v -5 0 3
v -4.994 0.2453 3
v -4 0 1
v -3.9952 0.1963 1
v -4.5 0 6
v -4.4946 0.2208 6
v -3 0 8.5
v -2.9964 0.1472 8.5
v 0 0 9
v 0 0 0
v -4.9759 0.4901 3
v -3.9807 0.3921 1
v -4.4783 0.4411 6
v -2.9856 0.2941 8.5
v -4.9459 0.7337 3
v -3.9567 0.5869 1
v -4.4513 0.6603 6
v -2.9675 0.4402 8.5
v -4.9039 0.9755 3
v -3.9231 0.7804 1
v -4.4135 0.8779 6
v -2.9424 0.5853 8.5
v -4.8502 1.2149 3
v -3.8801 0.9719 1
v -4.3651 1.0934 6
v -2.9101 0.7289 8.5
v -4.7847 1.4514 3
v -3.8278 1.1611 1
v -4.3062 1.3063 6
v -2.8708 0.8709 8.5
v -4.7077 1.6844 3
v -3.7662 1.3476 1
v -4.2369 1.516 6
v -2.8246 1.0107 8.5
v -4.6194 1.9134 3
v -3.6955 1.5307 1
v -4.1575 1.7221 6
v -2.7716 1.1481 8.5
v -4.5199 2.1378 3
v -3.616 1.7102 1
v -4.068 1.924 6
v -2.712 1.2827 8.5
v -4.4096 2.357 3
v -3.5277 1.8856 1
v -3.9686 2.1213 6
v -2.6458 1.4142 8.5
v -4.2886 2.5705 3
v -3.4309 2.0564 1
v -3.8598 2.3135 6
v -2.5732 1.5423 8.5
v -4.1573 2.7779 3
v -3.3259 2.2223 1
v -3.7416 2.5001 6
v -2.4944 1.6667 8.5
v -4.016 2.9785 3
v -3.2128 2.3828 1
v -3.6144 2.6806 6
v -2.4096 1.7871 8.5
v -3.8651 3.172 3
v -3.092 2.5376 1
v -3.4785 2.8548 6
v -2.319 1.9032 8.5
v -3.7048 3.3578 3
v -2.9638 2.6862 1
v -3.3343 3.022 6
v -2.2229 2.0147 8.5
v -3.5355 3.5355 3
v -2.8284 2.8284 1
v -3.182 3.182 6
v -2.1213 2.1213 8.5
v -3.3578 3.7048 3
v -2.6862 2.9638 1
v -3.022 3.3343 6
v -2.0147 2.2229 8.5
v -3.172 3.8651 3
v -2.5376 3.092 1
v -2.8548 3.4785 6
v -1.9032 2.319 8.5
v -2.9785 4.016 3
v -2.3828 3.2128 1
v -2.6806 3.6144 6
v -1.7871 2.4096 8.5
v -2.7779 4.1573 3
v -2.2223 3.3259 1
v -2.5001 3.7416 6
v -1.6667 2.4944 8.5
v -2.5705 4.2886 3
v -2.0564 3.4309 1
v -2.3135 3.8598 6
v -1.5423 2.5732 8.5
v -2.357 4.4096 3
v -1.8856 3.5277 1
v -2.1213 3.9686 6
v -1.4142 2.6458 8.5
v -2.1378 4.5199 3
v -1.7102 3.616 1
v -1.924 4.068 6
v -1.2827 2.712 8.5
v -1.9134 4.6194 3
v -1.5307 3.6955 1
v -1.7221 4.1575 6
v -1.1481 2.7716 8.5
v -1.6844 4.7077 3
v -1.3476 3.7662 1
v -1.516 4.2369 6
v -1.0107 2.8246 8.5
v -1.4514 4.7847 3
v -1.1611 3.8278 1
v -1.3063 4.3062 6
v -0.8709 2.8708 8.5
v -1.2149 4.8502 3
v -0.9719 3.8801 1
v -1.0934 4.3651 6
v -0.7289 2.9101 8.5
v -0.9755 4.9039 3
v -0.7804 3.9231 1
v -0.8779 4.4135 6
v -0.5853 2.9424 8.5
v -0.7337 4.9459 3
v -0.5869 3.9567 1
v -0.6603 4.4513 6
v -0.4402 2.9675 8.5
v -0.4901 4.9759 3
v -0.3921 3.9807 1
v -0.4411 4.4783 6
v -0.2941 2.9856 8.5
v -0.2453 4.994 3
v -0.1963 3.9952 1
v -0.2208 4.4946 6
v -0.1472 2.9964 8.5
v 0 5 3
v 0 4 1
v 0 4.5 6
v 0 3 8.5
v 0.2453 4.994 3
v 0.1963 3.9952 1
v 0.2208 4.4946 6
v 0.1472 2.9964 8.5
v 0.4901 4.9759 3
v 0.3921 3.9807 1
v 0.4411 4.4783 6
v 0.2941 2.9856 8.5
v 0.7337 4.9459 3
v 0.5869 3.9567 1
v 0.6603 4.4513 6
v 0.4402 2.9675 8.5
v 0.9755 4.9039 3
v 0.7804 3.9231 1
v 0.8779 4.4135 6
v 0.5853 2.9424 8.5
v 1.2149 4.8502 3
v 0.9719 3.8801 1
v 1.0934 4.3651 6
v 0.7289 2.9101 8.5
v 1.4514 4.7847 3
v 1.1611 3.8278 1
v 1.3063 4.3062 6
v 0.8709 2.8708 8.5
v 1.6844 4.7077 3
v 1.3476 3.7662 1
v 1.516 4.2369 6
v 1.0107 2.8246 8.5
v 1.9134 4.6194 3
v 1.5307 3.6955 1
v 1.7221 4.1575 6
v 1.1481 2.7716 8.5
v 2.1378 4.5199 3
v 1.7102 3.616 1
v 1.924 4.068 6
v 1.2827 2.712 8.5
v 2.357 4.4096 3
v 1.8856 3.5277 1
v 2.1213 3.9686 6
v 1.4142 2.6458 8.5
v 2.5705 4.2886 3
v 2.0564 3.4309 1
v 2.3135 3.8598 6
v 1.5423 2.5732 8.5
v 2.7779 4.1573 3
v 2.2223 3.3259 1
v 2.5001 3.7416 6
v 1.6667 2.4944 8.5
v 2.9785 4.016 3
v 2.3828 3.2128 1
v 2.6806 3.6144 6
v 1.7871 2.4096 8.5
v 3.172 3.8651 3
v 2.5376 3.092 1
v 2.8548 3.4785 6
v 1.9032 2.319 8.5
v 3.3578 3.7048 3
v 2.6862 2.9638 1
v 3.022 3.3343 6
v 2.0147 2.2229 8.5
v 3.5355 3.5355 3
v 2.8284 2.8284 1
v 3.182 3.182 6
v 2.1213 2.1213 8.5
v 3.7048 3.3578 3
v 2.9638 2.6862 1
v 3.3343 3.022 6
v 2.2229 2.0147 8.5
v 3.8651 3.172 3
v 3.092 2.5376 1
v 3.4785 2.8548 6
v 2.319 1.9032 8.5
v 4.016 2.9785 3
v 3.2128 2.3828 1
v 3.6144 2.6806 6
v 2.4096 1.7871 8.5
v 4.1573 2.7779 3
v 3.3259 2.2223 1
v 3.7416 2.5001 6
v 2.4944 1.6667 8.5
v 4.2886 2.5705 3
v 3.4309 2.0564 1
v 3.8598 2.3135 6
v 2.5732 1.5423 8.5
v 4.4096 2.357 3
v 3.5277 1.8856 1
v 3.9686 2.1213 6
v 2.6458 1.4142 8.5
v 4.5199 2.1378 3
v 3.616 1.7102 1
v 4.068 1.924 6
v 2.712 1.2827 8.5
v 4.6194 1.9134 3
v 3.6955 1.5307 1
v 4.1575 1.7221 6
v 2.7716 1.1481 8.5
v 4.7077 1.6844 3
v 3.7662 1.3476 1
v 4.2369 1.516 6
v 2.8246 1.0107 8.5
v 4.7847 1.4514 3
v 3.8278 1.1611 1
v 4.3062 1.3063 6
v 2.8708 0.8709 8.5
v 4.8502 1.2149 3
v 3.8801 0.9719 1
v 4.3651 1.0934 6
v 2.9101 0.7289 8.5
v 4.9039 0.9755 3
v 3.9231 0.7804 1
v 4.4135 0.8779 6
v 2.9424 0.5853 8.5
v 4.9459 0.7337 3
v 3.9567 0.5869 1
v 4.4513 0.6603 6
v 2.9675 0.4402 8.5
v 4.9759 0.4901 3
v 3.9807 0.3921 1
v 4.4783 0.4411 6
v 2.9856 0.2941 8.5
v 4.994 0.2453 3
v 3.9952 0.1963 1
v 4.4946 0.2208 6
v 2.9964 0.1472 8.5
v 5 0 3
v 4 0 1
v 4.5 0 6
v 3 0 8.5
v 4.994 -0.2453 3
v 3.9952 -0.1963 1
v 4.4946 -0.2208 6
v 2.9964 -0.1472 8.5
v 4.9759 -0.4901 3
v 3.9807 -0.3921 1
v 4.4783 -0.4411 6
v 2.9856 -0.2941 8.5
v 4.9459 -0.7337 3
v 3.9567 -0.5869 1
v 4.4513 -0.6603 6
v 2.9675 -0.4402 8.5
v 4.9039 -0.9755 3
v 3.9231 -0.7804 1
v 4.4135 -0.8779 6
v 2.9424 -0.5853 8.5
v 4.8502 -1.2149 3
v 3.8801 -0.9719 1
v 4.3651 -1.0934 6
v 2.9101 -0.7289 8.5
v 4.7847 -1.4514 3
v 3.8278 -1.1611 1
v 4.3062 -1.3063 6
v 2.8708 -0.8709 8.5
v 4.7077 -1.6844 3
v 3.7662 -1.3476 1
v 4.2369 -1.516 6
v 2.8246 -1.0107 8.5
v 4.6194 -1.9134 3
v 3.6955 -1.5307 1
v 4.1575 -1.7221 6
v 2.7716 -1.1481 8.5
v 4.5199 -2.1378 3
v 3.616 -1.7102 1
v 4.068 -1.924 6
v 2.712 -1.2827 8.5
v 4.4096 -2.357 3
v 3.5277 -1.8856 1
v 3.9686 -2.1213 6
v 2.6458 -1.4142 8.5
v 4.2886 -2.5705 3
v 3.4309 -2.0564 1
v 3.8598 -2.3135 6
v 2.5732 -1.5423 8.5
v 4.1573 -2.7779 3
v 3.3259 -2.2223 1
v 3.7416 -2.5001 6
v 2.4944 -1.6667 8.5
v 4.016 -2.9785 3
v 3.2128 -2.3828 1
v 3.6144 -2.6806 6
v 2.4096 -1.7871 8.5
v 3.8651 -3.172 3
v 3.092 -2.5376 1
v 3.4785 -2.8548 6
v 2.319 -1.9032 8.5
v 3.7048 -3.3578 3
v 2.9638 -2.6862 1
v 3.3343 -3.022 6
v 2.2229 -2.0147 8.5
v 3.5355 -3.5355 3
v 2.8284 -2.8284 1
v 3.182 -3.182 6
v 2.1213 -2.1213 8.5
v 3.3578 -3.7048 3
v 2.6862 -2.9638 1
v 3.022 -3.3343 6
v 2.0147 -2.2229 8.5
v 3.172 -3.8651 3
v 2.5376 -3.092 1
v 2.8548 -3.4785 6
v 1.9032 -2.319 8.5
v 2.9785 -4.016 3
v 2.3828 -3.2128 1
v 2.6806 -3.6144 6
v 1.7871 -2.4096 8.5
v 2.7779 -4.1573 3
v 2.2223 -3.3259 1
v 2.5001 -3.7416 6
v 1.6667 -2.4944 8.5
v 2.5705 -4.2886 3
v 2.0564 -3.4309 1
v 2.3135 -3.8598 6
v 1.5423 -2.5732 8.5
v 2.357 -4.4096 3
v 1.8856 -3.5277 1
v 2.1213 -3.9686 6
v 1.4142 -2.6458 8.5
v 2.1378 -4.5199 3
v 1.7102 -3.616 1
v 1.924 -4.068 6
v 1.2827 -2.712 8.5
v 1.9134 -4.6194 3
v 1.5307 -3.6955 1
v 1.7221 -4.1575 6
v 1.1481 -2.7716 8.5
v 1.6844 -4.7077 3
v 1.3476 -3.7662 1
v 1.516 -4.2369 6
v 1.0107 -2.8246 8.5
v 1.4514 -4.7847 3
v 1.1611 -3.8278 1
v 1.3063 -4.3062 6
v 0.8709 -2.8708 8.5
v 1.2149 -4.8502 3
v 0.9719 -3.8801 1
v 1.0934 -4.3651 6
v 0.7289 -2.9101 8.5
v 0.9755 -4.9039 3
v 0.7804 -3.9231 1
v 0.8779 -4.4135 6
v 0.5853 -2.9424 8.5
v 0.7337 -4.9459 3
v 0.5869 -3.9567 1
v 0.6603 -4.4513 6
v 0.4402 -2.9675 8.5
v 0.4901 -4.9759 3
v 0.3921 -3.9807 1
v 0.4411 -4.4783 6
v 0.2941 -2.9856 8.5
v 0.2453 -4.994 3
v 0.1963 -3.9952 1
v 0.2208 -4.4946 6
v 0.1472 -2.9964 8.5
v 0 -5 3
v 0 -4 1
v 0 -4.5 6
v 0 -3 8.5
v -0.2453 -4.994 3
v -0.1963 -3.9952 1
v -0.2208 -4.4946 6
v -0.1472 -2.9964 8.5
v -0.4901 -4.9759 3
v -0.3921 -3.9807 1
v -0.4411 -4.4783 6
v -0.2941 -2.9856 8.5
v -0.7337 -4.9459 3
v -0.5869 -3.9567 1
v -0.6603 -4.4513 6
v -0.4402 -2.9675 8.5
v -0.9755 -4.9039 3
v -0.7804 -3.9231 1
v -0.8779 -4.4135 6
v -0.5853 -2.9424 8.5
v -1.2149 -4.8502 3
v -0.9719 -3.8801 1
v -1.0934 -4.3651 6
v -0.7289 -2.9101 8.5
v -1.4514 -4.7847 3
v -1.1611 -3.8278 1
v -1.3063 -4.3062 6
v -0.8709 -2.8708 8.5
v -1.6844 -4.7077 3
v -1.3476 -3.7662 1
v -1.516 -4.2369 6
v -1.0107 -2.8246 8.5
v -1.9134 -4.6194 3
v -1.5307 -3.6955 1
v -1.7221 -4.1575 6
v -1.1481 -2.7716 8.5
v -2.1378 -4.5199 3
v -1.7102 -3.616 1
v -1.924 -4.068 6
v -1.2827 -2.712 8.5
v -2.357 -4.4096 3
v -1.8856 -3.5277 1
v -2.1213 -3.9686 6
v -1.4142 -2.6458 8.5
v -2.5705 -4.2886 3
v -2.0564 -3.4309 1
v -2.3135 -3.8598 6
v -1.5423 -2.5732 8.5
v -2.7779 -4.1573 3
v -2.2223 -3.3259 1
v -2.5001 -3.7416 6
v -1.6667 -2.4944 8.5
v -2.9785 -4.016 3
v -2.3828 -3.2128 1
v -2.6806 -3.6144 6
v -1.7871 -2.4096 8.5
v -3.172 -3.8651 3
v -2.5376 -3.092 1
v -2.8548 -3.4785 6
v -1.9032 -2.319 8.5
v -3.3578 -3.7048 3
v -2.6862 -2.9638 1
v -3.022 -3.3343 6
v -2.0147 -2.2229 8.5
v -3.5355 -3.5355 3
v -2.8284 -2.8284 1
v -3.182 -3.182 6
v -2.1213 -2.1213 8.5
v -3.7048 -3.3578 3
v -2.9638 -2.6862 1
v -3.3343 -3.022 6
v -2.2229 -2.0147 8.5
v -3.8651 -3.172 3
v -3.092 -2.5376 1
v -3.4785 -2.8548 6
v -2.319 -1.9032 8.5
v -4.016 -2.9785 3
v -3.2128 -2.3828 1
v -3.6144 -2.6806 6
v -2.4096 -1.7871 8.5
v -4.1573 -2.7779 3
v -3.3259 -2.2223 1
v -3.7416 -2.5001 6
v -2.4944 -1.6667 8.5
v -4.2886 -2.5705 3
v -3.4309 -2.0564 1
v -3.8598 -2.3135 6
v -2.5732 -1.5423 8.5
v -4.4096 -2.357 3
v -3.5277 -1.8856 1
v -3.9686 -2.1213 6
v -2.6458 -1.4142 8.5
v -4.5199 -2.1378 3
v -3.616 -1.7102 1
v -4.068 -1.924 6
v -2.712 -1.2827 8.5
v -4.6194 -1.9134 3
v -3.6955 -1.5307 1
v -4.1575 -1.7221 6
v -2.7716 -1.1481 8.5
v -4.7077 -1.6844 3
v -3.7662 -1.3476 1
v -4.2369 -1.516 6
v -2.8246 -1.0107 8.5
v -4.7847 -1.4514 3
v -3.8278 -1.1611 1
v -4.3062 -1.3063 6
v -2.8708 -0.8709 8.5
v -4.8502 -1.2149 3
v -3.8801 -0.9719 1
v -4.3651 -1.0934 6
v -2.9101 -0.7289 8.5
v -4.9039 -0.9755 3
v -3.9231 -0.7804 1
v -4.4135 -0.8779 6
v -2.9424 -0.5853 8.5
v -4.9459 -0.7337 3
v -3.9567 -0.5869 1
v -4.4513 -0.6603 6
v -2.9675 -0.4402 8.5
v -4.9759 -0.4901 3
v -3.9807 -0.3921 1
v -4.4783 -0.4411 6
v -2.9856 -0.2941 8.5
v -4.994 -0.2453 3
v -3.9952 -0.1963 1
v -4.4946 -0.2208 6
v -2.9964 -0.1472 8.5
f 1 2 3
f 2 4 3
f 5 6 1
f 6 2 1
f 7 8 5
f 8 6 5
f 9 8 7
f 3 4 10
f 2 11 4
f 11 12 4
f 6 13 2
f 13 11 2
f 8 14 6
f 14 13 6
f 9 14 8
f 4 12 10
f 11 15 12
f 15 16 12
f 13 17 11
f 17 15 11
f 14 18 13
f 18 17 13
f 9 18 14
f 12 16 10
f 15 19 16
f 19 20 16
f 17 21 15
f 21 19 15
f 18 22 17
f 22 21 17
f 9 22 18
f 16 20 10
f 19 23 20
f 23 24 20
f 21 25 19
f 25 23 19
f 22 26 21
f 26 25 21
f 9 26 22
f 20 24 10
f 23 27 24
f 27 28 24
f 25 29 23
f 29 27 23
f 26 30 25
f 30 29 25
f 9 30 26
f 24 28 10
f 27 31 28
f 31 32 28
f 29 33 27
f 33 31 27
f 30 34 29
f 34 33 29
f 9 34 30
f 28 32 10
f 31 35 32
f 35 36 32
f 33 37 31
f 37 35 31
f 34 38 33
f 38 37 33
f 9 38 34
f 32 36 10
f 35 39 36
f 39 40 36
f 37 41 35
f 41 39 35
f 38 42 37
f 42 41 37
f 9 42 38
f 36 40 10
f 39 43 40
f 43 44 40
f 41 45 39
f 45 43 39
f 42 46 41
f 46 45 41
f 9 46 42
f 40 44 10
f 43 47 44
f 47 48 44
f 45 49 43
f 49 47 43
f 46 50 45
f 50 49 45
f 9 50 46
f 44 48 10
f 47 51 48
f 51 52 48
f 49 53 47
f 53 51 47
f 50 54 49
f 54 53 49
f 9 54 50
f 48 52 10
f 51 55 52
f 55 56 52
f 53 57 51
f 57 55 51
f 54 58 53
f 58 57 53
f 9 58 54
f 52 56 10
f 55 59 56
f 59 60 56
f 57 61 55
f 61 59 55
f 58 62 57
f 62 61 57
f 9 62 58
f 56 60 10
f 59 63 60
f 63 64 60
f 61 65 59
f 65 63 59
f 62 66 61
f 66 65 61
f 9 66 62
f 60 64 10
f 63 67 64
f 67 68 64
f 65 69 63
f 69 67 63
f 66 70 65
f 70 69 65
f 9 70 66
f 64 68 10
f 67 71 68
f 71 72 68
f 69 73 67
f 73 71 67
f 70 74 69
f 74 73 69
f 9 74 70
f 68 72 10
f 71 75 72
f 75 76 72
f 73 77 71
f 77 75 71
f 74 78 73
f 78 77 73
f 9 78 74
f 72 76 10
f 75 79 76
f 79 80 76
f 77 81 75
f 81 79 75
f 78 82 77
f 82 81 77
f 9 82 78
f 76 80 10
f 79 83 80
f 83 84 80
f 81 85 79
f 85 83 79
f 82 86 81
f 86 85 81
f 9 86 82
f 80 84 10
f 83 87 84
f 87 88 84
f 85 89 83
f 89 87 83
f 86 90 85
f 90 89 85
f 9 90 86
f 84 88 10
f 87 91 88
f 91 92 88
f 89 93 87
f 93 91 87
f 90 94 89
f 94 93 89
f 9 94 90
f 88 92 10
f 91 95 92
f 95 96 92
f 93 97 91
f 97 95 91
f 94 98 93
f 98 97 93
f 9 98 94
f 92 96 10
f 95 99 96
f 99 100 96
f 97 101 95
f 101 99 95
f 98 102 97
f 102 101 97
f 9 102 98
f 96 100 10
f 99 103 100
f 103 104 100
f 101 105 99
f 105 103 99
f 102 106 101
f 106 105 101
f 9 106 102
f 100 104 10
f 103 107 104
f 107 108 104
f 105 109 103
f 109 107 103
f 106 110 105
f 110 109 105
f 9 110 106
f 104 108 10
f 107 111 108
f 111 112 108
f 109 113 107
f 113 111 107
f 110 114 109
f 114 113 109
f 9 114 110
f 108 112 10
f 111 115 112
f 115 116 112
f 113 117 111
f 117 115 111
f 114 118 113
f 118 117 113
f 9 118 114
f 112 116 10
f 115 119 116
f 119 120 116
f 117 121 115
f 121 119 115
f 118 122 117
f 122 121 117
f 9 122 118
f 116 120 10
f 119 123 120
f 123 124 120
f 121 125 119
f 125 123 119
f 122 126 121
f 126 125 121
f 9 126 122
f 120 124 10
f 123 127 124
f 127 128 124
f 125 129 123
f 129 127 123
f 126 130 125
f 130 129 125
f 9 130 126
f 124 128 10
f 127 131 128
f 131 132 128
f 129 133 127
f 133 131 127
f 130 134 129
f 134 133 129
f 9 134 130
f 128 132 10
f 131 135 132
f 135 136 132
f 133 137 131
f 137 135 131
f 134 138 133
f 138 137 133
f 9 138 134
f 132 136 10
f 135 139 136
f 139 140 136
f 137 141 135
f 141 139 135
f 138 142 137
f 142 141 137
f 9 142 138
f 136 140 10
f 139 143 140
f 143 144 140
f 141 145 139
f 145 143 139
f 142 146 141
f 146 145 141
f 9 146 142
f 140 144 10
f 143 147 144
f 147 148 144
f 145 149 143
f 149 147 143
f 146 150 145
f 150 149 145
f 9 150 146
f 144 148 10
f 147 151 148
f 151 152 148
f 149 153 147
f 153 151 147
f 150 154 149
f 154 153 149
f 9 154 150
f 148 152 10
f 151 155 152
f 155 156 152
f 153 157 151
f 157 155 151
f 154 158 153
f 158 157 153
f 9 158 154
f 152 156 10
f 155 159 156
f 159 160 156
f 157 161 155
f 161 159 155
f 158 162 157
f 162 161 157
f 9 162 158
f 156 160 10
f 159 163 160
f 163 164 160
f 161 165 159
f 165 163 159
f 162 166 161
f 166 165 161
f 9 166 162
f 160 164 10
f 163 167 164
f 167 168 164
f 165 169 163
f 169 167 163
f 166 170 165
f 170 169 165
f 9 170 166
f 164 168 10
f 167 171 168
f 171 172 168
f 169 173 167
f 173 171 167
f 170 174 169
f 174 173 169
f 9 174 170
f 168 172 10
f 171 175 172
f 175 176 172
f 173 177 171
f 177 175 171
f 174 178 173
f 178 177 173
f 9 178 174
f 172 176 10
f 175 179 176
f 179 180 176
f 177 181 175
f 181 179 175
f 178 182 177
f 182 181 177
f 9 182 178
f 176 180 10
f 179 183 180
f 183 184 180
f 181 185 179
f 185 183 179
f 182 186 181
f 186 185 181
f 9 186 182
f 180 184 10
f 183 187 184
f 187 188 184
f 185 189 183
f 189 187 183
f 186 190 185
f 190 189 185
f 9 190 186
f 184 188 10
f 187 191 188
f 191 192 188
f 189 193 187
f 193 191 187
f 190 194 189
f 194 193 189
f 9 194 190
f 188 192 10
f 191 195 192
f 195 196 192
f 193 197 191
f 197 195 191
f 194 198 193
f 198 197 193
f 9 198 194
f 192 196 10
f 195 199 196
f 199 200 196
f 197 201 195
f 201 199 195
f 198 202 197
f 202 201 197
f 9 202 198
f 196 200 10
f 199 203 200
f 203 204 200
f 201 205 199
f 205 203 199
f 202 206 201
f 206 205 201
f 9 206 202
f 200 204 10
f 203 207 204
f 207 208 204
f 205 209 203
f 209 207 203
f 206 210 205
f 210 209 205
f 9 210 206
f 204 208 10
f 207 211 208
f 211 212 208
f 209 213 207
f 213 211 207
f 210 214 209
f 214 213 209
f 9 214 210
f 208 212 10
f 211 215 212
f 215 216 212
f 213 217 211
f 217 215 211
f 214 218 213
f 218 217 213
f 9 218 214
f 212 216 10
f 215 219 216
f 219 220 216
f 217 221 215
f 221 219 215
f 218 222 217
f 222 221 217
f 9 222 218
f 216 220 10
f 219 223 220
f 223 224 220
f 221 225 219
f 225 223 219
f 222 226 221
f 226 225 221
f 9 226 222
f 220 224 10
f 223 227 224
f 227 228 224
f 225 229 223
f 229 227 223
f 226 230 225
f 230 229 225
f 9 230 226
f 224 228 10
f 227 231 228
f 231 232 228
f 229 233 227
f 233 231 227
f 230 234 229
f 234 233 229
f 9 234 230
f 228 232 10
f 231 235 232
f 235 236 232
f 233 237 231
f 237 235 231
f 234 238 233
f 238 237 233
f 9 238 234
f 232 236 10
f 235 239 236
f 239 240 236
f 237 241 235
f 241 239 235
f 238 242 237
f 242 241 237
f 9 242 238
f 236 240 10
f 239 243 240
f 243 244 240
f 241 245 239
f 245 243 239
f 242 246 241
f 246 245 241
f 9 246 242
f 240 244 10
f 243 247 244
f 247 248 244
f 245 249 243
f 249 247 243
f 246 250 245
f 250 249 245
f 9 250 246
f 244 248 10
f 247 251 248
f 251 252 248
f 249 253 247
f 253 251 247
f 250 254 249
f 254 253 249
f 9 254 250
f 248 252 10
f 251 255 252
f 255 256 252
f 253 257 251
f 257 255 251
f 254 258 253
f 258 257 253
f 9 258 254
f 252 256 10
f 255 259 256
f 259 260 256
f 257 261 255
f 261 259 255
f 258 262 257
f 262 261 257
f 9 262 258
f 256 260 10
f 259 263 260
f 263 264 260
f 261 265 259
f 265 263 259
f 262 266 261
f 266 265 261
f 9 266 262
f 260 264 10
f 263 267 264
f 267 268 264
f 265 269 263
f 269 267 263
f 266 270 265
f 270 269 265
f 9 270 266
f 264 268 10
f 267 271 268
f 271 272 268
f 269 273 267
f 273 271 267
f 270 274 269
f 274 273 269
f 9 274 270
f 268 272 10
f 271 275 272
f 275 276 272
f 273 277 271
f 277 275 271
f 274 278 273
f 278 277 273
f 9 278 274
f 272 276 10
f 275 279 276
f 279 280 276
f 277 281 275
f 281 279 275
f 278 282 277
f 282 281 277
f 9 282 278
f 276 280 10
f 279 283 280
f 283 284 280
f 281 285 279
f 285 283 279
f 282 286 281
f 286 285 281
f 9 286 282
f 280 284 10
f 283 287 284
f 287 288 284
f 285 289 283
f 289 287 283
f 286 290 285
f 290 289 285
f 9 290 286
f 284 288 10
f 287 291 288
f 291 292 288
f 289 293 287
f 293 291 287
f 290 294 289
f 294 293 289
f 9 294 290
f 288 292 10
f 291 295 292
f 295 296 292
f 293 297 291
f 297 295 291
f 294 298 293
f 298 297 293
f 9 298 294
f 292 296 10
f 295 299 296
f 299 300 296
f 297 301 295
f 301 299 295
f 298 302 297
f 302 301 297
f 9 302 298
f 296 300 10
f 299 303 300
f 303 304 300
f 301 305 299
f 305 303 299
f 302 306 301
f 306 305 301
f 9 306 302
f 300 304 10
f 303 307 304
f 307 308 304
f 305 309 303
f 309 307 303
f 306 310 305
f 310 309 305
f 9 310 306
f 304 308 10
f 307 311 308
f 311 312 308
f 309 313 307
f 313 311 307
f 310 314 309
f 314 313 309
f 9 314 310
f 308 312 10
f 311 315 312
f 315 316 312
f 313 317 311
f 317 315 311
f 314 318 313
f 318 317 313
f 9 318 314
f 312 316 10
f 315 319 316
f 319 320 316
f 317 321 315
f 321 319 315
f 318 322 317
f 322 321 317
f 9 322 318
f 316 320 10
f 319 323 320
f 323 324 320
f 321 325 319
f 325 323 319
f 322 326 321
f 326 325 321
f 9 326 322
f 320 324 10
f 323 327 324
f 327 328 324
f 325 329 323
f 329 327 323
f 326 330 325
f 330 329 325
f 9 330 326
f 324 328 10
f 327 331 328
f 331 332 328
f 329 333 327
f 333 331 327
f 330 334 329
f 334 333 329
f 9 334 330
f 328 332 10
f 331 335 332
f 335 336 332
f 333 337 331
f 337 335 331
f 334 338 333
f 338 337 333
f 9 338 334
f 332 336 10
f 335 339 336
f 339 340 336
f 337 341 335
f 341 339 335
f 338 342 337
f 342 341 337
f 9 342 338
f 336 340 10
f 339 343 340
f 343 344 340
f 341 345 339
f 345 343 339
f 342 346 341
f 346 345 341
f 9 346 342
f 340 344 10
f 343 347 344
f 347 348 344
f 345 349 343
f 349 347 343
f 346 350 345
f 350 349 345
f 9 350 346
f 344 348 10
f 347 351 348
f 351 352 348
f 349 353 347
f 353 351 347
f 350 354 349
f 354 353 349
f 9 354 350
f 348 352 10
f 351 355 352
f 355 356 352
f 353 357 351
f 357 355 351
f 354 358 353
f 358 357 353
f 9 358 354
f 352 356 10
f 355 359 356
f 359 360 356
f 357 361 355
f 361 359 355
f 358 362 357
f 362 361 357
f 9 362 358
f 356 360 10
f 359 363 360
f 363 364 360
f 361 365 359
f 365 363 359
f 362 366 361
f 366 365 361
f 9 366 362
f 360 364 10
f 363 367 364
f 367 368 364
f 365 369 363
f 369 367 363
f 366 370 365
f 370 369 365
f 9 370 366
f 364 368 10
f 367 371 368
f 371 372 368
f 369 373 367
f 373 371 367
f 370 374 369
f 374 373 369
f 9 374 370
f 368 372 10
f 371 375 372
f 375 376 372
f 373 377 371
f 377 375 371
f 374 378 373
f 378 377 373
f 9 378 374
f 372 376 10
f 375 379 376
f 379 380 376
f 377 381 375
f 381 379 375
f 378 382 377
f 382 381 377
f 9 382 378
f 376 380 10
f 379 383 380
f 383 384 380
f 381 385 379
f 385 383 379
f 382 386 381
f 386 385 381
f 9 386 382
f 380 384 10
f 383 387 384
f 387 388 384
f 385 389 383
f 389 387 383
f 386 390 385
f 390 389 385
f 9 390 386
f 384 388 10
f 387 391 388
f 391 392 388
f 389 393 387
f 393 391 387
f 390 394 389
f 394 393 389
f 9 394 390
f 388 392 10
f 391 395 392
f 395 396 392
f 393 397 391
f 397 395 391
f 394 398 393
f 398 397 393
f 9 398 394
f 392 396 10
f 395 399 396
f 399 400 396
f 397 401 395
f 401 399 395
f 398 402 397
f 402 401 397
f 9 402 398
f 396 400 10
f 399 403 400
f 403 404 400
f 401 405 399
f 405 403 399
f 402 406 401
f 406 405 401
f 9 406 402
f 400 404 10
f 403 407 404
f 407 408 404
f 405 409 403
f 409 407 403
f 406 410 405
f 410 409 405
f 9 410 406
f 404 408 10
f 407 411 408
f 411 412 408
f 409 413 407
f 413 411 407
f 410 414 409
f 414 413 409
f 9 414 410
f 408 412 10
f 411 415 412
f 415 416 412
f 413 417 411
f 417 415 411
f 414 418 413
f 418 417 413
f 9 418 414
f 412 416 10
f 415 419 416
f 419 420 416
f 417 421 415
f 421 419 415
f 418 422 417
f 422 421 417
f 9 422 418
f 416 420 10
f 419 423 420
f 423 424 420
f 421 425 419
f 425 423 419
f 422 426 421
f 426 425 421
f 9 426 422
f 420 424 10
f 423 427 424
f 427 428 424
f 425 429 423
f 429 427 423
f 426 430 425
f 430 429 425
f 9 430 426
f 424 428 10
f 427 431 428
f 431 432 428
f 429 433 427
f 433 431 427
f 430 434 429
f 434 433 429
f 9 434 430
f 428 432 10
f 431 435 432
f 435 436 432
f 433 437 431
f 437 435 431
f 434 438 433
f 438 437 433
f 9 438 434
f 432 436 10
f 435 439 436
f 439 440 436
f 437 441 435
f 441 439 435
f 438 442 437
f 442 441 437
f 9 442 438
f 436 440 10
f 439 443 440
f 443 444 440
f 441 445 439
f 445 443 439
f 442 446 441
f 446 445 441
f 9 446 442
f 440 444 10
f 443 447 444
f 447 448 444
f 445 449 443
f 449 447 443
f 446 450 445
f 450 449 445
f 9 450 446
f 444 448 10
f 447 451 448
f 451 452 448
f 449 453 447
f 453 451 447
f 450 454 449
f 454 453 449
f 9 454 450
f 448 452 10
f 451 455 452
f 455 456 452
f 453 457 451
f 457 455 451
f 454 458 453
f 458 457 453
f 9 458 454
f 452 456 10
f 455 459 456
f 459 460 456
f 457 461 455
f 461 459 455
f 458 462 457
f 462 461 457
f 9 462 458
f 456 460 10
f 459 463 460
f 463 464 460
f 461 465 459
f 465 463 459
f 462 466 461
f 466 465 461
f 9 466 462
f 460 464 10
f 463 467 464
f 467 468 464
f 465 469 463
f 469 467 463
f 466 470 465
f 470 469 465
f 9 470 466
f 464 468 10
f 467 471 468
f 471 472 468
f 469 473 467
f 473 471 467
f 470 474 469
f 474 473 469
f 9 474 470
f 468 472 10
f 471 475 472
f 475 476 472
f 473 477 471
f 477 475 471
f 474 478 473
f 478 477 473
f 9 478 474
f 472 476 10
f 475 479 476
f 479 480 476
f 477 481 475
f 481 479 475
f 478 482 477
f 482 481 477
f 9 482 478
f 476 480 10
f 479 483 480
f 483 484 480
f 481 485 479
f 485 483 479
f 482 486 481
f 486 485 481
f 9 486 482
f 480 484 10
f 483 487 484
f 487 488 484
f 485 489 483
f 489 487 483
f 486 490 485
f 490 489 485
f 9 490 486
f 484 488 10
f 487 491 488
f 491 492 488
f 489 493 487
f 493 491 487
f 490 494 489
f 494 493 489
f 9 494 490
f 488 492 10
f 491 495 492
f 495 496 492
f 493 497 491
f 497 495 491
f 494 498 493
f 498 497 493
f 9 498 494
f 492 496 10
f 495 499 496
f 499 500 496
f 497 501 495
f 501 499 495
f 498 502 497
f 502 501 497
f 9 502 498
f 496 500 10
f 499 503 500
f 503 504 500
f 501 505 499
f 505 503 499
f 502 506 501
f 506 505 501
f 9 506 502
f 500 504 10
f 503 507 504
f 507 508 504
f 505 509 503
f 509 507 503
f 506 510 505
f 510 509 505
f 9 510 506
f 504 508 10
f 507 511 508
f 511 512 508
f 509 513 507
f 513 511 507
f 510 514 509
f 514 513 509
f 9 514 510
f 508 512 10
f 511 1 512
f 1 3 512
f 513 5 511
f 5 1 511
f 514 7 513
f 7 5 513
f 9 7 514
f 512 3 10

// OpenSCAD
// Auto-generated from tests/data/feature_fixtures_manifest.json
// fixture: revolve_vase_dome
// fixture_type: revolve
// description: Complex vase-dome profile revolved around Z; no Phase 2 upgrade (curved non-primitive boundary).
$fn = 96;

profile = [
    [0.000000, 0.000000],
    [4.000000, 1.000000],
    [5.000000, 3.000000],
    [4.500000, 6.000000],
    [3.000000, 8.500000],
    [0.000000, 9.000000]
];

rotate_extrude($fn=128) polygon(points=profile);
